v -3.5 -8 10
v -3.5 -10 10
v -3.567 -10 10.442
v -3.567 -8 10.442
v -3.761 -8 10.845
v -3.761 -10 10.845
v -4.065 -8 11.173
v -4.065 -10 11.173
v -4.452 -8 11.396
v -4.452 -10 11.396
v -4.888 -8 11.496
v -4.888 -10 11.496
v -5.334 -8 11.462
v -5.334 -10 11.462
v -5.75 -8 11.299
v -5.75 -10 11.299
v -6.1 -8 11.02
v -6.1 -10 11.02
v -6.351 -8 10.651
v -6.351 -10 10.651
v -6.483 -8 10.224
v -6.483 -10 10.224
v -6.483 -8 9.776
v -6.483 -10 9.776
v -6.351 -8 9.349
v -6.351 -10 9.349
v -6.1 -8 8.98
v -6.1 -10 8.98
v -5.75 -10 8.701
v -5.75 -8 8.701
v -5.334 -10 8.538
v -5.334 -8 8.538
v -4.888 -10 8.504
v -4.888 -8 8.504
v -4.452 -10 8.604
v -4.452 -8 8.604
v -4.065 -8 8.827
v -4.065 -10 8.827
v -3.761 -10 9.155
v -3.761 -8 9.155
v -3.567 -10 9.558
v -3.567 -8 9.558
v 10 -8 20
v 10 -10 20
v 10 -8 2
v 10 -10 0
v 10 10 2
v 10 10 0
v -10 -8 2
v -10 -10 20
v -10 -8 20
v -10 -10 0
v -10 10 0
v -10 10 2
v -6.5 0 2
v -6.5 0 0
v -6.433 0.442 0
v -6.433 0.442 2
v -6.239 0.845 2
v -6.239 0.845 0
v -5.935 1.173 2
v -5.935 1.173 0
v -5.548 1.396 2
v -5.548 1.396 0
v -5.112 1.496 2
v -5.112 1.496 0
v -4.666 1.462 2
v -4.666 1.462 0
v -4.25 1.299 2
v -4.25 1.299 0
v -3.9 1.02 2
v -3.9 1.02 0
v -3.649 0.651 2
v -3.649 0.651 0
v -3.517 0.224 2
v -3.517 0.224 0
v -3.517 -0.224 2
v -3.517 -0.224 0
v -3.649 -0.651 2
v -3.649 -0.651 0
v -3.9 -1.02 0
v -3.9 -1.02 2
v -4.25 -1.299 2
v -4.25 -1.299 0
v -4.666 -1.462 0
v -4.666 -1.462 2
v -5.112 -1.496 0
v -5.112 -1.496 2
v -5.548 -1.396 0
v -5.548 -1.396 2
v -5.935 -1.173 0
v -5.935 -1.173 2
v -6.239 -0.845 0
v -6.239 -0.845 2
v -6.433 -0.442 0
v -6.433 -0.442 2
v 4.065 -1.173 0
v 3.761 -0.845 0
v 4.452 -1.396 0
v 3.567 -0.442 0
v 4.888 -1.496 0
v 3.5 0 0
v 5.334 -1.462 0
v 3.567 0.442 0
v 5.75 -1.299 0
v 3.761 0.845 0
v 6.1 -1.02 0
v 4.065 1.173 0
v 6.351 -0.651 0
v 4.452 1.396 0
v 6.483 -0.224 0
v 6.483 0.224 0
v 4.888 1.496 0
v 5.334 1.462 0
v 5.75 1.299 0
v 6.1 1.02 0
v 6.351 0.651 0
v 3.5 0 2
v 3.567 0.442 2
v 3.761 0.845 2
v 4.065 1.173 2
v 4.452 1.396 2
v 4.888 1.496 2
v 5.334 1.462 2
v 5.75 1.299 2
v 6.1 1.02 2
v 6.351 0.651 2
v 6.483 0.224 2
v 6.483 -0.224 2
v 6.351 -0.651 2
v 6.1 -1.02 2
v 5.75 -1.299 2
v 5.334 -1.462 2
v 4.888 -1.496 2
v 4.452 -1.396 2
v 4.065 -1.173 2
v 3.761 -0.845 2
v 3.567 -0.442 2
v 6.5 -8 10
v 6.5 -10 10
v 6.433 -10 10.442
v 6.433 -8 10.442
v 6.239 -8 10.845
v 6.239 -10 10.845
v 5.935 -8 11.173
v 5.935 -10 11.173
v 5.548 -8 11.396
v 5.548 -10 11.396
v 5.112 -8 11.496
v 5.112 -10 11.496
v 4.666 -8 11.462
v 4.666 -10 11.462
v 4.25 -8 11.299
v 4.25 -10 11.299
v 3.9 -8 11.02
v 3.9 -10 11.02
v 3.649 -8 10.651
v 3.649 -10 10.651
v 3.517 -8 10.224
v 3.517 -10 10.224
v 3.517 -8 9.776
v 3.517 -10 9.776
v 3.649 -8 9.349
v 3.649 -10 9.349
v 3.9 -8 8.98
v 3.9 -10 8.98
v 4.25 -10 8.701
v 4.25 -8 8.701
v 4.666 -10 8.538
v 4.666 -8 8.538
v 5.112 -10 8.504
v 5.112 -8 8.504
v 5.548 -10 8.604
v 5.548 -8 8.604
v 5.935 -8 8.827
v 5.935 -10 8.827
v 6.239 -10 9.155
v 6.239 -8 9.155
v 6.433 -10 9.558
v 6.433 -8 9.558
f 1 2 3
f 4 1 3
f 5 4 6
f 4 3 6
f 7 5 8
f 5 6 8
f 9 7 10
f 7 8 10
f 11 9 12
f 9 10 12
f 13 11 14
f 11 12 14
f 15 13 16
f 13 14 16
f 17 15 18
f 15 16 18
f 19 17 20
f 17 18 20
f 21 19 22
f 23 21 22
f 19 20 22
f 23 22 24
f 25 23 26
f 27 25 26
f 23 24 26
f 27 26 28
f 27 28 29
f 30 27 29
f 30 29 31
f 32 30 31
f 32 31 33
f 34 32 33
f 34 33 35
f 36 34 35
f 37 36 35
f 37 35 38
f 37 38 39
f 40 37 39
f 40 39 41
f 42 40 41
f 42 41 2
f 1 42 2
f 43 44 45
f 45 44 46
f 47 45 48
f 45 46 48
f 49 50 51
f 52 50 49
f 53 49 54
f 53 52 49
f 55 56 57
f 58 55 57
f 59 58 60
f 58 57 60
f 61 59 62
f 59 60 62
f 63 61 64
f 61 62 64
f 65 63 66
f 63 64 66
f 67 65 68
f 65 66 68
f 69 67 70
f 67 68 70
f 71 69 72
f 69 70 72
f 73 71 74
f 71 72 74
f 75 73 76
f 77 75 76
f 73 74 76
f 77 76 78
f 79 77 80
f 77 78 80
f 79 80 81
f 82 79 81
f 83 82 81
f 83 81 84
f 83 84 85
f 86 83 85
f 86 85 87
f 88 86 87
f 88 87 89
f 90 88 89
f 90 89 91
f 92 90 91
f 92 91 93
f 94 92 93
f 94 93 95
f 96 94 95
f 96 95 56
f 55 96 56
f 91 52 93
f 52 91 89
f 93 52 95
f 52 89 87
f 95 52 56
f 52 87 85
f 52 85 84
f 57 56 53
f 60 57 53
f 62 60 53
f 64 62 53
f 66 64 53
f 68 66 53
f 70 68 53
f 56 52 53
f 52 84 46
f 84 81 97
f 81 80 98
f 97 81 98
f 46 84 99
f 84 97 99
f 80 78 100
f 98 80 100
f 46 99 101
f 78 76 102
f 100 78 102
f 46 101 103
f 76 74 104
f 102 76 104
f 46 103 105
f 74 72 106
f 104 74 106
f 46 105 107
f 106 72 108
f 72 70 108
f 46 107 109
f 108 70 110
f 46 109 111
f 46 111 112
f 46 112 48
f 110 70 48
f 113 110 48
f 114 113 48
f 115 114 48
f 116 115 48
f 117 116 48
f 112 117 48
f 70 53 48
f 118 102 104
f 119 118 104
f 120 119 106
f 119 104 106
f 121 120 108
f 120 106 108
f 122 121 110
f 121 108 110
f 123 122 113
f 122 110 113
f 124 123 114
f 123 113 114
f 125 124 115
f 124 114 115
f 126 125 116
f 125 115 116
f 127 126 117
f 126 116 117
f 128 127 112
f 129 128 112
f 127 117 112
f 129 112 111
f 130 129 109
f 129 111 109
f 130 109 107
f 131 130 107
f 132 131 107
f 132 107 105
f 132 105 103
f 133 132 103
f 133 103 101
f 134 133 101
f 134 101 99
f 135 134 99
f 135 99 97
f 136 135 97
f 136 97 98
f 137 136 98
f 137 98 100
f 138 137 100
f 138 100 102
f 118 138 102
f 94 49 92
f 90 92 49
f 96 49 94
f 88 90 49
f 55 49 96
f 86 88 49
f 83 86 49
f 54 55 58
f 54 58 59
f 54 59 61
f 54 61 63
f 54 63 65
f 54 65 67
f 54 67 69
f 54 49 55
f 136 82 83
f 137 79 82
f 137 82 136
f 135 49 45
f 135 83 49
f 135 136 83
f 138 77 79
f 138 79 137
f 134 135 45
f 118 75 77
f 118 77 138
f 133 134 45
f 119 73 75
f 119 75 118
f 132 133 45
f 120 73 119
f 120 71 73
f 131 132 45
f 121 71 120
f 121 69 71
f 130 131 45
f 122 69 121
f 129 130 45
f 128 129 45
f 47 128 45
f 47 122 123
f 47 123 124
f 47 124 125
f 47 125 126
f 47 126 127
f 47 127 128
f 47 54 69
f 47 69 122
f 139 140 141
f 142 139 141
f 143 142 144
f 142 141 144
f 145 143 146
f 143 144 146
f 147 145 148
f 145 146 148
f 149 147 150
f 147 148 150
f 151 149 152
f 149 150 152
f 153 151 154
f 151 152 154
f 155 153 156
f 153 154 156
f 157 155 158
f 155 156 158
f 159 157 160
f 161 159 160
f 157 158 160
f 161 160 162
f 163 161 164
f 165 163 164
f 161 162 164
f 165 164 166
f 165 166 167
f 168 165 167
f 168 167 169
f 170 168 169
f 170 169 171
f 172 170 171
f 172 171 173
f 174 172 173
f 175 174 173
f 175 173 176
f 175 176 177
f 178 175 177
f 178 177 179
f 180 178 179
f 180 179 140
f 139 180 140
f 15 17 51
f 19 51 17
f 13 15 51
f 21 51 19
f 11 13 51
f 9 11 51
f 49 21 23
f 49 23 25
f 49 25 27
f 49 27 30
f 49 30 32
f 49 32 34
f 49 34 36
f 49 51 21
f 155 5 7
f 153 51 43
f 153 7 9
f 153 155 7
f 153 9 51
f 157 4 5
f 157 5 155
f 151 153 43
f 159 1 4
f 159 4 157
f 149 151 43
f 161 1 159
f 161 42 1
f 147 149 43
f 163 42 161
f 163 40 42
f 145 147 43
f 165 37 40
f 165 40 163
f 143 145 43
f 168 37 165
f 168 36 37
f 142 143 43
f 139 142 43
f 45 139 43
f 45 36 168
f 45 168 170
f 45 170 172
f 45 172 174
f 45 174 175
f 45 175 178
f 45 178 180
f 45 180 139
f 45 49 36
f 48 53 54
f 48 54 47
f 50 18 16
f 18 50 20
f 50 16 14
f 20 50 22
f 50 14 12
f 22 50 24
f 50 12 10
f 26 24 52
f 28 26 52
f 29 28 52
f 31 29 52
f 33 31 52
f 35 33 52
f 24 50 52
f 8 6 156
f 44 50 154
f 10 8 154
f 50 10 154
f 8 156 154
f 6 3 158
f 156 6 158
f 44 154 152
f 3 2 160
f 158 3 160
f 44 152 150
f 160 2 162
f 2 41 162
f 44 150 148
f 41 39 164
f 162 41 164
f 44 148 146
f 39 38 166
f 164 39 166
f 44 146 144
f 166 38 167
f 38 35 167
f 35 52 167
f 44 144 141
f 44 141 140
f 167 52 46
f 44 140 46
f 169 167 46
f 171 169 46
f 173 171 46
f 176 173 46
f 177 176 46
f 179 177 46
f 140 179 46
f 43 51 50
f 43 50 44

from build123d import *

# Parameters (mm, degrees)
SKETCH_1_W          = 20
SKETCH_1_H          = 20
EXTRUDE_1_DEPTH     = 2
SKETCH_2_W          = 20
SKETCH_2_H          = 2
EXTRUDE_2_DEPTH     = 18
SKETCH_4_R          = 1.5
CUT_EXTRUDE_1_DEPTH = 18
SKETCH_6_R          = 1.5
CUT_EXTRUDE_2_DEPTH = 18


with BuildPart() as part:
    # 草图1 → 凸台-拉伸1 (new body)
    with BuildSketch(Plane.XY):
        Rectangle(SKETCH_1_W, SKETCH_1_H)
    extrude(amount=EXTRUDE_1_DEPTH)

    # 草图2 → 凸台-拉伸2 (add)
    with BuildSketch(Plane.XY.offset(2)):
        with Locations((0, -9)):
            Rectangle(SKETCH_2_W, SKETCH_2_H)
    extrude(amount=EXTRUDE_2_DEPTH)

    # 草图4 → 切除-拉伸1 (cut)
    with BuildSketch(Plane.XZ.offset(10)):
        with Locations((-5, 10)):
            Circle(SKETCH_4_R)
        with Locations((5, 10)):
            Circle(SKETCH_4_R)
    extrude(amount=-CUT_EXTRUDE_1_DEPTH, mode=Mode.SUBTRACT)

    # 草图6 → 切除-拉伸2 (cut)
    with BuildSketch(Plane(origin=(0, 0, 0), x_dir=(-1, 0, 0), z_dir=(0, 0, -1))):
        with Locations((5, 0)):
            Circle(SKETCH_6_R)
        with Locations((-5, 0)):
            Circle(SKETCH_6_R)
    extrude(amount=-CUT_EXTRUDE_2_DEPTH, mode=Mode.SUBTRACT)


solid = part.part
